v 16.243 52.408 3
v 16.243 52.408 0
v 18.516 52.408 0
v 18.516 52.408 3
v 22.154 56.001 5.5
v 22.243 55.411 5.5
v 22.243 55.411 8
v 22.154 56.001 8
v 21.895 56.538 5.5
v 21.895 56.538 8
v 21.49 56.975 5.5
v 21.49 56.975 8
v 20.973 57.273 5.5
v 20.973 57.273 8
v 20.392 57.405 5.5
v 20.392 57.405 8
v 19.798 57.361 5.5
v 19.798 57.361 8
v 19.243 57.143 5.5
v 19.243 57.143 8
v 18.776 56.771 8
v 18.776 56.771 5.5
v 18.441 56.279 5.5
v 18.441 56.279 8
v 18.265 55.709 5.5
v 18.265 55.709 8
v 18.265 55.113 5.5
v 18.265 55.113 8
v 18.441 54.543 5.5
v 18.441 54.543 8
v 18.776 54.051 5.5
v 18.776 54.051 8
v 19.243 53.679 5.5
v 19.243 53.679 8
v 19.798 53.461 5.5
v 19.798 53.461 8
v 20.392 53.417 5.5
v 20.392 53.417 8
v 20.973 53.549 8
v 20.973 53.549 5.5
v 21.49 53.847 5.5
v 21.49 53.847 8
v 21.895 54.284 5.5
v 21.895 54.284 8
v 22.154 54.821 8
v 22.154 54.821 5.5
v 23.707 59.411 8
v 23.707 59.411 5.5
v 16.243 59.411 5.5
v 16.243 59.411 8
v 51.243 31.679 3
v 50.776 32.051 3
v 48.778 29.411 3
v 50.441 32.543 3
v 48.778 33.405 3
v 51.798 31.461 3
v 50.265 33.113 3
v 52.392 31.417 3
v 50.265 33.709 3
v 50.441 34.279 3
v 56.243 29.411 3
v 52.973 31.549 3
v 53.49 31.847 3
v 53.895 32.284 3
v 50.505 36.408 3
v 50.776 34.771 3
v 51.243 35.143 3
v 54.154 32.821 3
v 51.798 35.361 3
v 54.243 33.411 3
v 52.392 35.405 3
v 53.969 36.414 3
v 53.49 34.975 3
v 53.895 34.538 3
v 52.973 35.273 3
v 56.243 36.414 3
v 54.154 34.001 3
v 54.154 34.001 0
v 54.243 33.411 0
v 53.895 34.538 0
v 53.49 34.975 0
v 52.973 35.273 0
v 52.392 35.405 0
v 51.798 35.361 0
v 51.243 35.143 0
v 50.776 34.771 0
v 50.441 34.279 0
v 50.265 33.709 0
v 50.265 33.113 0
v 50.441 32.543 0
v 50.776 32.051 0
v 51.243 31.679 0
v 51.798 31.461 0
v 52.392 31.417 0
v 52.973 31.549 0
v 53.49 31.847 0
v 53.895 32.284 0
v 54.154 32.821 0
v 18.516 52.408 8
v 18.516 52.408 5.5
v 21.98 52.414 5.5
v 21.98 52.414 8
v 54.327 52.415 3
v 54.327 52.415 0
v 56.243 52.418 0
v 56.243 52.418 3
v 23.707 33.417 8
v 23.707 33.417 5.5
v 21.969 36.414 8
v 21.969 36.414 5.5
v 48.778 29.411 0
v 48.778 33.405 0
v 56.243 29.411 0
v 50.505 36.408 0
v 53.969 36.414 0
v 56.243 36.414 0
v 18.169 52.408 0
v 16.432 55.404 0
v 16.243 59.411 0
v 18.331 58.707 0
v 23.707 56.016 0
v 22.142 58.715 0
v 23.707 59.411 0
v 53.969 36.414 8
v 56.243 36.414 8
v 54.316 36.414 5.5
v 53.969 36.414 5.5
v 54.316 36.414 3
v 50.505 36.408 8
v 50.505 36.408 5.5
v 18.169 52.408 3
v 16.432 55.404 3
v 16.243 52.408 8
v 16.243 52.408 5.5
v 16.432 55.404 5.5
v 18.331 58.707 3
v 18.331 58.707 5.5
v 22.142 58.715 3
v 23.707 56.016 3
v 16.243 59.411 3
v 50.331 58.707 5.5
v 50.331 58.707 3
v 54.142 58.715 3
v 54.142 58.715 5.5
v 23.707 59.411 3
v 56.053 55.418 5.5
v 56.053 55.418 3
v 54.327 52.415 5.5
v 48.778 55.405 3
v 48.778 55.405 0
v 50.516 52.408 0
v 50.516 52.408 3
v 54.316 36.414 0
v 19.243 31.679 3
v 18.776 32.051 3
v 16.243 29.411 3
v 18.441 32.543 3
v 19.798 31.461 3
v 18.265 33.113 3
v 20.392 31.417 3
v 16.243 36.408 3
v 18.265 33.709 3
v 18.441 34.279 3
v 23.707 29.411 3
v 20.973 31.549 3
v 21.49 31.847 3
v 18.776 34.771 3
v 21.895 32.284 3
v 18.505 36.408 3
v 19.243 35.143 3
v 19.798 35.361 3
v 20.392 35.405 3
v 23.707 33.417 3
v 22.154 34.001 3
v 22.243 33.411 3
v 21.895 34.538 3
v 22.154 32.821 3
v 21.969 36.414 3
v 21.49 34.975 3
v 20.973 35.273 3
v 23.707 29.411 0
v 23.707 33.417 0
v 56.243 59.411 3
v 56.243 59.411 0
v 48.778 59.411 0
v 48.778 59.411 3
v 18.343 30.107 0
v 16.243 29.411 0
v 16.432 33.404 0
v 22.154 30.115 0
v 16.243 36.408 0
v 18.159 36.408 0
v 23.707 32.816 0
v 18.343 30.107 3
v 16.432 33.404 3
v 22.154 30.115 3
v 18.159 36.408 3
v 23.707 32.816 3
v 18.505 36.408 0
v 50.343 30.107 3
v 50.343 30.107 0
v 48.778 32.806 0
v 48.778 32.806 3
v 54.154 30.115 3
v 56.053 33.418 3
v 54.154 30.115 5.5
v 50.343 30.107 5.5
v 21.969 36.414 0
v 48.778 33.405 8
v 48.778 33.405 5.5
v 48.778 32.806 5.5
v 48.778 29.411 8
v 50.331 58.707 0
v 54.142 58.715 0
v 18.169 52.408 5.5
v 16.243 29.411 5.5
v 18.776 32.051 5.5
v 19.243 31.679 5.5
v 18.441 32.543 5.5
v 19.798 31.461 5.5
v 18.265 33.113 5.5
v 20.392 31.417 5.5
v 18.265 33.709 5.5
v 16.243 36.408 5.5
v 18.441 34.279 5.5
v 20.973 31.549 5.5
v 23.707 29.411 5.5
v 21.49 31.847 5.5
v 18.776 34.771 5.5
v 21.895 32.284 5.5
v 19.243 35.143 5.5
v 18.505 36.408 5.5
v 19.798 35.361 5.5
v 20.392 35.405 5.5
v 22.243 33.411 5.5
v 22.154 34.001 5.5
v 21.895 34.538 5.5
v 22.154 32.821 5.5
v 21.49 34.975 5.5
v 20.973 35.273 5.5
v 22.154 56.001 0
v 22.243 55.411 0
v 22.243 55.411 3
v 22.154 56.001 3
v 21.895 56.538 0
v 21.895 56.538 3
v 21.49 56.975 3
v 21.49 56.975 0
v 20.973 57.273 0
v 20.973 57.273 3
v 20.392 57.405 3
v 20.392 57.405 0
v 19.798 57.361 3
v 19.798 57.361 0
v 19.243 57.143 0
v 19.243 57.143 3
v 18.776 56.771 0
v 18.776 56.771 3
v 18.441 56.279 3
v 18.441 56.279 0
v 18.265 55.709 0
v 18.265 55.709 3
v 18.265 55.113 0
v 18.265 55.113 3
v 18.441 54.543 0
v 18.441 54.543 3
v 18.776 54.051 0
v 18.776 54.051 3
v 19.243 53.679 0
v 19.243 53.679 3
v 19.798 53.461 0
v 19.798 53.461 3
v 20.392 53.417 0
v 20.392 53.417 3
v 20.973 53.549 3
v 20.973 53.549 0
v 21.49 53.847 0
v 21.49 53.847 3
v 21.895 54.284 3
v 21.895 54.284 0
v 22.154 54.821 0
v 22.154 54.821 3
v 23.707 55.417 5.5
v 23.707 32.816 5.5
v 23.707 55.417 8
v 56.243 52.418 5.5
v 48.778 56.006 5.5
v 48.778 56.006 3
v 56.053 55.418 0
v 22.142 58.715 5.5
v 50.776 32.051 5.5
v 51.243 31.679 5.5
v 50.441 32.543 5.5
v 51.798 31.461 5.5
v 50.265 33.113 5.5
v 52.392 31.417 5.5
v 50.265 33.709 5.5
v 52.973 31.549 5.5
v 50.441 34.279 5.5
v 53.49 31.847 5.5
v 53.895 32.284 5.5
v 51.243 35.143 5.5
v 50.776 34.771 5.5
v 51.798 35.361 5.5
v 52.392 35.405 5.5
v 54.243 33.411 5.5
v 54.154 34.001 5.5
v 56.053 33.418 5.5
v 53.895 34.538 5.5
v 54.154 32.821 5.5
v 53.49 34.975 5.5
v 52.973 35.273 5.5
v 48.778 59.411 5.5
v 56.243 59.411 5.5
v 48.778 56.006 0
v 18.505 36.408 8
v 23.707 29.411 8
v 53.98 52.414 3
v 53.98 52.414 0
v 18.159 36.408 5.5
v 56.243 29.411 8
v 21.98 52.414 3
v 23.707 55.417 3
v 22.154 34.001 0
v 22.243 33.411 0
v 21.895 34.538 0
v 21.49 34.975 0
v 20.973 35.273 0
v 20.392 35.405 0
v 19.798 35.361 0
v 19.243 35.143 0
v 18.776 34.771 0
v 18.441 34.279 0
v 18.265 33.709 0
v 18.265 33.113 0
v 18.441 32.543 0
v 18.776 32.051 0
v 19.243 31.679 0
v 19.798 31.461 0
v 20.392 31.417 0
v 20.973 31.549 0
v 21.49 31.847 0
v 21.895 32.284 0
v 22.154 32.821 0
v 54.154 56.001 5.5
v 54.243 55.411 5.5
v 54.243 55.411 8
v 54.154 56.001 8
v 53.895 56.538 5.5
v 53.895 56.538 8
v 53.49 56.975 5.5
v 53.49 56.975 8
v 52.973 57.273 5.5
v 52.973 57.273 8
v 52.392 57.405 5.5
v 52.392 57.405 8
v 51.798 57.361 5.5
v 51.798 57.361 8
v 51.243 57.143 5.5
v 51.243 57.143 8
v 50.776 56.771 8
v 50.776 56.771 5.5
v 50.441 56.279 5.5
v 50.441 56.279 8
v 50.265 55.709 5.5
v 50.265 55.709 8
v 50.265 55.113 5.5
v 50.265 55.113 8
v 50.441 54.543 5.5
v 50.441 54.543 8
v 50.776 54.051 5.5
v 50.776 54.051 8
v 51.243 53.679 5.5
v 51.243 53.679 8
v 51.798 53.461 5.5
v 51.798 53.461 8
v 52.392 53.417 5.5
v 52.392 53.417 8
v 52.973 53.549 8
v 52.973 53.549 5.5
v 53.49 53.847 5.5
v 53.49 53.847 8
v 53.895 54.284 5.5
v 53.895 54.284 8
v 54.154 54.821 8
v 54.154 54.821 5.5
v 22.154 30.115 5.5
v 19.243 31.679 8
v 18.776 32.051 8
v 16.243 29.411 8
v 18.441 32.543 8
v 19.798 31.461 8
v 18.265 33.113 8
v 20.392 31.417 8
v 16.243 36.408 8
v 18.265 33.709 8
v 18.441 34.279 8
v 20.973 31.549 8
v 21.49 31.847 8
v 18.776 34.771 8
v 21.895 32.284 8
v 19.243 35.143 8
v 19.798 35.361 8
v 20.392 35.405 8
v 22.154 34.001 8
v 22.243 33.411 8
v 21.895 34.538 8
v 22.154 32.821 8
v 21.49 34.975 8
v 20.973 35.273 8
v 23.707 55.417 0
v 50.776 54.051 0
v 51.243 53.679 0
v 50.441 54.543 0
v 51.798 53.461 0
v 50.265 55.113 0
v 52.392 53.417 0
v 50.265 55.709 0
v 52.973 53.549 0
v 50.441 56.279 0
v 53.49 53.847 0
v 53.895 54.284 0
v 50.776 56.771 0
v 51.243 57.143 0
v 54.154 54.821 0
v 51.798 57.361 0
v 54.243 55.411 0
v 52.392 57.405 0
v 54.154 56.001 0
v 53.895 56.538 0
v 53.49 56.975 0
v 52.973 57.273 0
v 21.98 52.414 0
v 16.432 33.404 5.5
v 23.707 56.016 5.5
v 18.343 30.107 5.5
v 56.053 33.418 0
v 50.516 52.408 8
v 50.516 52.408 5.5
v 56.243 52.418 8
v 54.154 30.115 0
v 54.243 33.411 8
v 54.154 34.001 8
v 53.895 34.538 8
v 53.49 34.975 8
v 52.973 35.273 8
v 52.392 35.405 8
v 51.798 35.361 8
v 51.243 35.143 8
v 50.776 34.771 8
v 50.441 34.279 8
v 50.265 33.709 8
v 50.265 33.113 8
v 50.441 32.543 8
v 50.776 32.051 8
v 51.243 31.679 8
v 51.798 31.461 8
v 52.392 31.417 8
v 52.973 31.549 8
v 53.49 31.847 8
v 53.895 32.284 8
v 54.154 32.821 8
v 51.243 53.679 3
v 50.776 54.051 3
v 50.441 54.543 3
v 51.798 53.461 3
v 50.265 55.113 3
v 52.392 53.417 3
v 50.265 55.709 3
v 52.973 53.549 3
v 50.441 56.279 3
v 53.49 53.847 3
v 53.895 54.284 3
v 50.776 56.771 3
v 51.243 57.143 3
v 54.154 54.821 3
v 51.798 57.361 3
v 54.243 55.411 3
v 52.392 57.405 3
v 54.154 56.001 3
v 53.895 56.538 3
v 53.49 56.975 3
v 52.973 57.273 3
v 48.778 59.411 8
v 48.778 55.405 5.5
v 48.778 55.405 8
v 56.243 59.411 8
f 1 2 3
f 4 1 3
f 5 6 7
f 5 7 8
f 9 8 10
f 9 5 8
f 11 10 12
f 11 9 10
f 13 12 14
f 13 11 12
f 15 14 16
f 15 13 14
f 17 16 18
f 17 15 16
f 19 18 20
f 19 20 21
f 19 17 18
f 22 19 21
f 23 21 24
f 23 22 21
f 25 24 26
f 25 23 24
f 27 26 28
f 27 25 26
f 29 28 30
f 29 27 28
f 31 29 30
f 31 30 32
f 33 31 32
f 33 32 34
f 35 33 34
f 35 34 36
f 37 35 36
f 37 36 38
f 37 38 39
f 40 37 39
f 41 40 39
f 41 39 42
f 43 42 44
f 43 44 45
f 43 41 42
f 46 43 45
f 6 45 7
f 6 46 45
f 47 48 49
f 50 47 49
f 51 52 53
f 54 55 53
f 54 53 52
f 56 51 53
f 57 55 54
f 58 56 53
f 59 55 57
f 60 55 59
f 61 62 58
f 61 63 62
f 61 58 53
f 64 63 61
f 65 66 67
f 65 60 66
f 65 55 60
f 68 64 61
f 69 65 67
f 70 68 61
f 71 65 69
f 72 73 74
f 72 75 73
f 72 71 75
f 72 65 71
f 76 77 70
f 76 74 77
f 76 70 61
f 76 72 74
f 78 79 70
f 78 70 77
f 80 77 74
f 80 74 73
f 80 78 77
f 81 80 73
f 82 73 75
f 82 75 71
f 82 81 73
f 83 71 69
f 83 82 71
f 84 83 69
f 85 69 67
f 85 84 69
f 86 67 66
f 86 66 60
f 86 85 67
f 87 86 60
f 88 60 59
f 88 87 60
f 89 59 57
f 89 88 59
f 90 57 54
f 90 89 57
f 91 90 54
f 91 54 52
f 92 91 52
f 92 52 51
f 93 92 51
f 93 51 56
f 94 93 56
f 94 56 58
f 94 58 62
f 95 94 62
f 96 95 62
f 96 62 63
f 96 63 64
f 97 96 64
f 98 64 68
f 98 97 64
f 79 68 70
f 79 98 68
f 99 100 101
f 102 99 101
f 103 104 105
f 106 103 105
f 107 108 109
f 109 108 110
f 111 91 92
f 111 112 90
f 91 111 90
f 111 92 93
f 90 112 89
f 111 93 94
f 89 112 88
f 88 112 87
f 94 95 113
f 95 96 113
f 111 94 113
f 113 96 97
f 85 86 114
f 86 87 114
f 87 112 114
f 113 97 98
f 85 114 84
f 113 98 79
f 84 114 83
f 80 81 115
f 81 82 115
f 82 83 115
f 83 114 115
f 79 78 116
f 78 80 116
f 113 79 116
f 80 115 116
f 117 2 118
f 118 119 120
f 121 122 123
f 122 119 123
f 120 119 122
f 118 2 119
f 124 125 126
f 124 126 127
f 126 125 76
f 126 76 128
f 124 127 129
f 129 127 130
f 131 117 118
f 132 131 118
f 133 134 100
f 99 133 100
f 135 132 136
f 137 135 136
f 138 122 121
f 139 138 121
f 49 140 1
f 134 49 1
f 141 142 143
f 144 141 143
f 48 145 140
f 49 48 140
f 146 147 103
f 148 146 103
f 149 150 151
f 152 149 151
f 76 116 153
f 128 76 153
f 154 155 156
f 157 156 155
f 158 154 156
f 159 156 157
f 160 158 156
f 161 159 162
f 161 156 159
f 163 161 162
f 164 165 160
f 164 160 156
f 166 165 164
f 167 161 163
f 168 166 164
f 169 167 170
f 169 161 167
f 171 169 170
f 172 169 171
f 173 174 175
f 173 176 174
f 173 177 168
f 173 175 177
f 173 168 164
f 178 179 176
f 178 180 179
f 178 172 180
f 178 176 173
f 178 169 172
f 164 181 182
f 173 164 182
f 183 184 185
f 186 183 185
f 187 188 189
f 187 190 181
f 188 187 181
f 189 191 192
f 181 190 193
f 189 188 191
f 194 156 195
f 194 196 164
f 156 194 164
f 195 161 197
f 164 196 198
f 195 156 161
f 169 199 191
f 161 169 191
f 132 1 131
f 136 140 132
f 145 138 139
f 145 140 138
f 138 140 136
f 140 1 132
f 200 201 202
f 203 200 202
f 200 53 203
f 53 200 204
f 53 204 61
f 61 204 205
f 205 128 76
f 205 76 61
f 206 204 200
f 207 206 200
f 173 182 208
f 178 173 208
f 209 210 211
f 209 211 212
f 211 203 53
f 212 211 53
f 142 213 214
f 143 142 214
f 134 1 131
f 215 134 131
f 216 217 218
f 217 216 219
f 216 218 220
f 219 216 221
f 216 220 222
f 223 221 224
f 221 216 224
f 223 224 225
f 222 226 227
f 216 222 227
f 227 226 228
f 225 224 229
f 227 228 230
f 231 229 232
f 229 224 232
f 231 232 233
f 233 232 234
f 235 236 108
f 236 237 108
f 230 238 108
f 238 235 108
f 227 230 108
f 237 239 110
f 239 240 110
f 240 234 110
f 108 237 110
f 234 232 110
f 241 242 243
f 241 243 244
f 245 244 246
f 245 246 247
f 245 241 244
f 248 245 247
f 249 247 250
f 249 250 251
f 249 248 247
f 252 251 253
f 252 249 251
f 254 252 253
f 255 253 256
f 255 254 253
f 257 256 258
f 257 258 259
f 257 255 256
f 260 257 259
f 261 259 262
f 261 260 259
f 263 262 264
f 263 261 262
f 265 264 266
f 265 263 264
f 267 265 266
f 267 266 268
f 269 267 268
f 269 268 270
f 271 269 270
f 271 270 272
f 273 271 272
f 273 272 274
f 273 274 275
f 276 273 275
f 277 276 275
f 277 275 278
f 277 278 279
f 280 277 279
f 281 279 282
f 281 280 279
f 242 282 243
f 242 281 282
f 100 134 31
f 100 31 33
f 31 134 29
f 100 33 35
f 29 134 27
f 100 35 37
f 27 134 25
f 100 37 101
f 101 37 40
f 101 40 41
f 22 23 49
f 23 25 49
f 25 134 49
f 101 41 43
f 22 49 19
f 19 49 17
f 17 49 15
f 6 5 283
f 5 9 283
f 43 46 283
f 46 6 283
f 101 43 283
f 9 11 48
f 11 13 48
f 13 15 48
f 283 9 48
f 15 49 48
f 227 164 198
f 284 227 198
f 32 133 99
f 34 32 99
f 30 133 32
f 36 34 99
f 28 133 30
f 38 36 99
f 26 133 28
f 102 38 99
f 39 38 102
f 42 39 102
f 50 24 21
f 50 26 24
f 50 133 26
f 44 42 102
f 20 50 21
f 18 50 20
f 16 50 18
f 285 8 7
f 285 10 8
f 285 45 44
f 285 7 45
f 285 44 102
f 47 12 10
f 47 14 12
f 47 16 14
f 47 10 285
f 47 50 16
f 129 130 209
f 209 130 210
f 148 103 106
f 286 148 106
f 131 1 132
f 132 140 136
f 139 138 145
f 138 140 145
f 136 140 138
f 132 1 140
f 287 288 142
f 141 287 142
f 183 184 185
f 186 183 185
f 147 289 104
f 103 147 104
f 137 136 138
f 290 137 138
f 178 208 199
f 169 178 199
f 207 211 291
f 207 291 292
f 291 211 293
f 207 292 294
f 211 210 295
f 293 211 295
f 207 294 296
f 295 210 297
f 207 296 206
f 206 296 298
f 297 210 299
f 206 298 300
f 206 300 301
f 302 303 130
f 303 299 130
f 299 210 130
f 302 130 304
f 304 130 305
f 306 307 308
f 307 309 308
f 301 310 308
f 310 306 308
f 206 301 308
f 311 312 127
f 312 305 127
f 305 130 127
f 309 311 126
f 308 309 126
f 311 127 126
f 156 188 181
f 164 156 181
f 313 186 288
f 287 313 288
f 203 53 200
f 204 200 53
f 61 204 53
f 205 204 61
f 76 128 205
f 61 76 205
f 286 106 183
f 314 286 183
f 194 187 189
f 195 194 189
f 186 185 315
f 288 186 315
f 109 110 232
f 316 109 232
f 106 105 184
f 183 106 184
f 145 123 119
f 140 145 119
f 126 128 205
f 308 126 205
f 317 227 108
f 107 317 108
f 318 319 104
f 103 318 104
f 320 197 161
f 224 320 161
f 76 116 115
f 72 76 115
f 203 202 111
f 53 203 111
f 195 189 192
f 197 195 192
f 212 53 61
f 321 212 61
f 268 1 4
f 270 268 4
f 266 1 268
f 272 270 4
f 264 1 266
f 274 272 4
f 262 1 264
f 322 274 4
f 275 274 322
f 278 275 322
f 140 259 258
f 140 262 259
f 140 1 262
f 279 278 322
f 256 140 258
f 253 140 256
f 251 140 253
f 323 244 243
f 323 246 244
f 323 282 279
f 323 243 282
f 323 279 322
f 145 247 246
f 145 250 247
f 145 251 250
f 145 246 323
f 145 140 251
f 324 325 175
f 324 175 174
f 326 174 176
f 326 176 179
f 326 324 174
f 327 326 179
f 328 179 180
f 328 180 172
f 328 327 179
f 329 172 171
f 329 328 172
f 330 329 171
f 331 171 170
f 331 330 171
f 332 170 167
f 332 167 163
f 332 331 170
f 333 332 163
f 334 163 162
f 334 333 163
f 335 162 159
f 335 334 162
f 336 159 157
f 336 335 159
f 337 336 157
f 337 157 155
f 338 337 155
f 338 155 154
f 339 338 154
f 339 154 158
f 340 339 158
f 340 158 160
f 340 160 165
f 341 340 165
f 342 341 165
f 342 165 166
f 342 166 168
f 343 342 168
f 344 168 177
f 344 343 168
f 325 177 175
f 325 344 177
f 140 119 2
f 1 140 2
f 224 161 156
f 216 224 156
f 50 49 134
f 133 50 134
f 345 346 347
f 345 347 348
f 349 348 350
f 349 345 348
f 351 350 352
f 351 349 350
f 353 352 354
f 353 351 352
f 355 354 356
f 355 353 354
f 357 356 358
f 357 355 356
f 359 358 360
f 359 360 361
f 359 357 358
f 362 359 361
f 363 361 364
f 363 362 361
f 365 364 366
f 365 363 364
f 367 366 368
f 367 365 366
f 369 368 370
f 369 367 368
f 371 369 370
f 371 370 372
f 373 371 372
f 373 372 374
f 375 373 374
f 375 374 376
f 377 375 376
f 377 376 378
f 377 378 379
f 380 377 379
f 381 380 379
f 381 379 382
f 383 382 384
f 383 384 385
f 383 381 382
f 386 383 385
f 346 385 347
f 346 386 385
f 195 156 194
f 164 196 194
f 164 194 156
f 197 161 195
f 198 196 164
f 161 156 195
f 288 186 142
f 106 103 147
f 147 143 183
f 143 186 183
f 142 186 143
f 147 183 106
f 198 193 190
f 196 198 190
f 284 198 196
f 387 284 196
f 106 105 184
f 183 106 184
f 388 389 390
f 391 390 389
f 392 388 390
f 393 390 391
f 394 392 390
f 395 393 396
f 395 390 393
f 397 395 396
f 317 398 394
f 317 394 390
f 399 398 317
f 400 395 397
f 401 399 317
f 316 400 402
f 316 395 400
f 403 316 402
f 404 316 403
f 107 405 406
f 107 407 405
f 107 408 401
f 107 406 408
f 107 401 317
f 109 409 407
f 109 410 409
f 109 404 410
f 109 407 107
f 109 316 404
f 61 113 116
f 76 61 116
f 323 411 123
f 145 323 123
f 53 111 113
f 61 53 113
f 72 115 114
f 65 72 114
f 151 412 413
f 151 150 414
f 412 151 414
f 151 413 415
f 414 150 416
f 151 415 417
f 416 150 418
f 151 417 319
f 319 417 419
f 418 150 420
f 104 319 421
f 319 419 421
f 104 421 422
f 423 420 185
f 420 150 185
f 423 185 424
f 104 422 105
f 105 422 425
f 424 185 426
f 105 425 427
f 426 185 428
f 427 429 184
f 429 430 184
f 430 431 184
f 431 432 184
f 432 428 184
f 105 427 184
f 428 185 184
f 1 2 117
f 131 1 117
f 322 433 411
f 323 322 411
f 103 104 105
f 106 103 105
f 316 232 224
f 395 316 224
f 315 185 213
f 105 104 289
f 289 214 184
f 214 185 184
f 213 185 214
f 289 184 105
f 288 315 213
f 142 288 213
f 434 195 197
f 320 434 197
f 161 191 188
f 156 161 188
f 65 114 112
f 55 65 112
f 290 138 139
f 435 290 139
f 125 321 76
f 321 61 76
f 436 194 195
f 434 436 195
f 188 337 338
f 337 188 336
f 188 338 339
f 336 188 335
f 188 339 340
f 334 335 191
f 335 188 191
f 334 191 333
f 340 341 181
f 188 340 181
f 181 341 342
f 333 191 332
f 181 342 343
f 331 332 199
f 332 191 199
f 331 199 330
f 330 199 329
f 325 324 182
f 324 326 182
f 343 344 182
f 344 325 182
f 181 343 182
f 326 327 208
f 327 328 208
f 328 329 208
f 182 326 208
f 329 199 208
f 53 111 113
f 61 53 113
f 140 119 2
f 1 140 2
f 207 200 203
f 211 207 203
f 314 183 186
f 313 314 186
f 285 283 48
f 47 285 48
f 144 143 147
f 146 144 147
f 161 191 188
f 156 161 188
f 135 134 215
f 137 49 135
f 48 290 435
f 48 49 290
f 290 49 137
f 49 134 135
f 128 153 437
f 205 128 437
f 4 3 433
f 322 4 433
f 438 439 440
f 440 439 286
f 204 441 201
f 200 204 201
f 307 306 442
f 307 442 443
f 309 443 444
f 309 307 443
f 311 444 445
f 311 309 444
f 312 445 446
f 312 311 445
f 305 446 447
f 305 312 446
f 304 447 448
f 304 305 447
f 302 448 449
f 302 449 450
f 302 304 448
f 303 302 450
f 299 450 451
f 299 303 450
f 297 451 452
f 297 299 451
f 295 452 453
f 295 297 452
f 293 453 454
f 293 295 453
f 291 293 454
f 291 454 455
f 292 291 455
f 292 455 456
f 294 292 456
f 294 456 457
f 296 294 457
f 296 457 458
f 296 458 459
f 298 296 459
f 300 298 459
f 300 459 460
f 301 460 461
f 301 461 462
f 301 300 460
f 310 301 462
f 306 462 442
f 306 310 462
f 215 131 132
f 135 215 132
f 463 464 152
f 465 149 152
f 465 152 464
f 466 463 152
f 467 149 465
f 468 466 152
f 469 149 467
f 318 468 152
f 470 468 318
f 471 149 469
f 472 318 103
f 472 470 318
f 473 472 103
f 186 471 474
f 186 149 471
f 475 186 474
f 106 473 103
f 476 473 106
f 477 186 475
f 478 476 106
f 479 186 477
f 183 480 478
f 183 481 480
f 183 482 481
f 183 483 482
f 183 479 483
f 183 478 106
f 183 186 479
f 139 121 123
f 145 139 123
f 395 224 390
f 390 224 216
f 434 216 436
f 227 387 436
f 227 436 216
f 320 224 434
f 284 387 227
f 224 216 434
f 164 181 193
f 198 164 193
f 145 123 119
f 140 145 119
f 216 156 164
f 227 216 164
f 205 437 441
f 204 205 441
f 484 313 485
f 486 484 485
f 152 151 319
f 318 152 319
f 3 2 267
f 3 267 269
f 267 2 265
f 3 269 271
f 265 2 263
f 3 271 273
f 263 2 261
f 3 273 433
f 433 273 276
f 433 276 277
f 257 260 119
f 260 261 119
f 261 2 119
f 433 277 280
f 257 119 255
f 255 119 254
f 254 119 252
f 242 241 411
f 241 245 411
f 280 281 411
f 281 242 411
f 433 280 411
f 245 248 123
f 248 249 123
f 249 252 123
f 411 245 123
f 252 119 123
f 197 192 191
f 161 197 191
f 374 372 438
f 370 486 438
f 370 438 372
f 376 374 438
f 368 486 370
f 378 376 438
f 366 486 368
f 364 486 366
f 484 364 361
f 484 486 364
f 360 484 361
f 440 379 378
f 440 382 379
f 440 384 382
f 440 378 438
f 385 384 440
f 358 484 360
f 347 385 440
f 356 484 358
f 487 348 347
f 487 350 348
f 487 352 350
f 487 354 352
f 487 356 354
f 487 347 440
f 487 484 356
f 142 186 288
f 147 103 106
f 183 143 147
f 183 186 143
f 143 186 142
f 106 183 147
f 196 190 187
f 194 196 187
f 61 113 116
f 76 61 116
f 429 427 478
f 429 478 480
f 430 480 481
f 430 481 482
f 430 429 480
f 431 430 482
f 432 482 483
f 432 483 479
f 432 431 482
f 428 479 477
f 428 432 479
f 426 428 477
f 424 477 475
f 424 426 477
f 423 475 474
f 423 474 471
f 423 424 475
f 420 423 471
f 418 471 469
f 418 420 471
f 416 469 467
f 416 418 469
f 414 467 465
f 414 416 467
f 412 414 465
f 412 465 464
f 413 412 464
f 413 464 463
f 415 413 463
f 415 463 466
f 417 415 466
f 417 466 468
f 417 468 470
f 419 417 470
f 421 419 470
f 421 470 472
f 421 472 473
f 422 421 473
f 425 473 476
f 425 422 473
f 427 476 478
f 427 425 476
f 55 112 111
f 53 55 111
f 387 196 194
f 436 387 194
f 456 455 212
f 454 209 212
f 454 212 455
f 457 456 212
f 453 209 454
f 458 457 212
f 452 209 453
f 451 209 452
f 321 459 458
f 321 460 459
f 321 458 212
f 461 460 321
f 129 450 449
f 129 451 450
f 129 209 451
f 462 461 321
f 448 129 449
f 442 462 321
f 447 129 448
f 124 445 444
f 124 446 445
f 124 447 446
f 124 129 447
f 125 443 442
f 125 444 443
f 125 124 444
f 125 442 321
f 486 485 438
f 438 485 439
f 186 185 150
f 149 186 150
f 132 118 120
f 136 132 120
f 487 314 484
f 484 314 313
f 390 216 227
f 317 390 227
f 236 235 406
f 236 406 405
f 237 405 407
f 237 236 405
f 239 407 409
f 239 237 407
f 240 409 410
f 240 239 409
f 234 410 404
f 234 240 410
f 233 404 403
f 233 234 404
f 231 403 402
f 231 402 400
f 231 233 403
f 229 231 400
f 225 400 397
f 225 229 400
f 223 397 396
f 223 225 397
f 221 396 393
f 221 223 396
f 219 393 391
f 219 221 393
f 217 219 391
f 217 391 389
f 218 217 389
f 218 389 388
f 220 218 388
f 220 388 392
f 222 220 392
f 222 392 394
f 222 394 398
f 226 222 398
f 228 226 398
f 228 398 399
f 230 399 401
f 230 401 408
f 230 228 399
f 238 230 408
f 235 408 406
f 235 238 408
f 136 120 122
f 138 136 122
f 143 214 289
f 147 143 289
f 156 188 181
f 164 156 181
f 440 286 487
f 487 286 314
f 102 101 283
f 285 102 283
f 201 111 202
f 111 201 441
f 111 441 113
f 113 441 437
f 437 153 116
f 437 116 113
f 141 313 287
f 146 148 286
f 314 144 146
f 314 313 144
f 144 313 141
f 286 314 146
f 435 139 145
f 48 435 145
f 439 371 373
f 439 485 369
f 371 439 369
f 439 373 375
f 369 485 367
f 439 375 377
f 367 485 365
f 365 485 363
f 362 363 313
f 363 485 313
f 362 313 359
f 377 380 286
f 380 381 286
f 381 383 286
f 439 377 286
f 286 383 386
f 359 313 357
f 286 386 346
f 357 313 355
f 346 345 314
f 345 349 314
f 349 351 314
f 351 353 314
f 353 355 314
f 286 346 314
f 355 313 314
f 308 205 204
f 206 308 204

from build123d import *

# Parameters (mm, degrees)
F0_R      = 2
F1_DEPTH  = 3
F2_DEPTH  = 3
F3_DEPTH  = 2.5
F4_START  = 2.5
F1_FACE_R = 2
F4_DEPTH  = 2.5


with BuildPart() as f1:
    # F0 (on Top) → F1 (new body)
    with BuildSketch(Plane.XY):
        Polygon((56.2425711751, 29.4110085815), (56.2425711751, 36.414245103), (54.3157895307, 36.414245103), (56.0530762776, 33.4181404888), (54.1540001392, 30.1145803152), (50.3434950368, 30.1074484079), (48.7784756274, 32.8064627658), (48.7784756274, 29.4110085815), align=None)
        Polygon((56.0530762776, 33.4181404888), (54.3157895307, 36.414245103), (53.9690040281, 36.414245103), (50.5049084804, 36.4077615509), (48.7784756274, 33.4045250294), (48.7784756274, 32.8064627658), (50.3434950368, 30.1074484079), (54.1540001392, 30.1145803152), align=None)
        with Locations((52.2425711751, 33.4110085815)):
            Circle(F0_R, mode=Mode.SUBTRACT)
    extrude(amount=F1_DEPTH)


with BuildPart() as f1b:
    # F0 (on Top) → F1, piece 2 (new body)
    with BuildSketch(Plane.XY):
        Polygon((18.1588716375, 36.4077615509), (16.2425711751, 36.4077615509), (16.2425711751, 29.4110085815), (23.7066667228, 29.4110085815), (23.7066667228, 32.8155396842), (22.1540001392, 30.1145803152), (18.3434950368, 30.1074484079), (16.4320660726, 33.4038766742), align=None)
        Polygon((18.5049084804, 36.4077615509), (18.1588716375, 36.4077615509), (16.4320660726, 33.4038766742), (18.3434950368, 30.1074484079), (22.1540001392, 30.1145803152), (23.7066667228, 32.8155396842), (23.7066667228, 33.4174921336), (21.9690040281, 36.414245103), align=None)
        with Locations((20.2425711751, 33.4110085815)):
            Circle(F0_R, mode=Mode.SUBTRACT)
    extrude(amount=F1_DEPTH)


with BuildPart() as f1c:
    # F0 (on Top) → F1, piece 3 (new body)
    with BuildSketch(Plane.XY):
        Polygon((23.7066667228, 59.4110085815), (16.2425711751, 59.4110085815), (16.2425711751, 52.40777206), (18.1693528195, 52.40777206), (16.4320660726, 55.4038766742), (18.331142211, 58.7074368479), (22.1416473134, 58.7145687551), (23.7066667228, 56.0155543972), align=None)
        Polygon((23.7066667228, 55.4174921336), (23.7066667228, 56.0155543972), (22.1416473134, 58.7145687551), (18.331142211, 58.7074368479), (16.4320660726, 55.4038766742), (18.1693528195, 52.40777206), (18.5161383221, 52.40777206), (21.9802338698, 52.4142556121), align=None)
        with Locations((20.2425711751, 55.4110085815)):
            Circle(F0_R, mode=Mode.SUBTRACT)
    extrude(amount=F1_DEPTH)


with BuildPart() as f1d:
    # F0 (on Top) → F1, piece 4 (new body)
    with BuildSketch(Plane.XY):
        Polygon((56.2425711751, 59.4110085815), (48.7784756274, 59.4110085815), (48.7784756274, 56.0064774788), (50.331142211, 58.7074368479), (54.1416473134, 58.7145687551), (56.0530762776, 55.4181404888), (54.3266434245, 52.4149039673), (56.2425711751, 52.4184899011), align=None)
        Polygon((50.331142211, 58.7074368479), (48.7784756274, 56.0064774788), (48.7784756274, 55.4045250294), (50.5161383221, 52.40777206), (53.9802338698, 52.4142556121), (54.3266434245, 52.4149039673), (56.0530762776, 55.4181404888), (54.1416473134, 58.7145687551), align=None)
        with Locations((52.2425711751, 55.4110085815)):
            Circle(F0_R, mode=Mode.SUBTRACT)
    extrude(amount=F1_DEPTH)


with BuildPart() as f2:
    # F0 (on Top) → F2 (new body, through all)
    with BuildSketch(Plane.XY):
        Polygon((56.2425711751, 29.4110085815), (56.2425711751, 36.414245103), (54.3157895307, 36.414245103), (56.0530762776, 33.4181404888), (54.1540001392, 30.1145803152), (50.3434950368, 30.1074484079), (48.7784756274, 32.8064627658), (48.7784756274, 29.4110085815), align=None)
    extrude(amount=F2_DEPTH)


with BuildPart() as f2b:
    # F0 (on Top) → F2, piece 2 (new body, through all)
    with BuildSketch(Plane.XY):
        Polygon((56.2425711751, 59.4110085815), (48.7784756274, 59.4110085815), (48.7784756274, 56.0064774788), (50.331142211, 58.7074368479), (54.1416473134, 58.7145687551), (56.0530762776, 55.4181404888), (54.3266434245, 52.4149039673), (56.2425711751, 52.4184899011), align=None)
    extrude(amount=F2_DEPTH)


with BuildPart() as f2c:
    # F0 (on Top) → F2, piece 3 (new body, through all)
    with BuildSketch(Plane.XY):
        Polygon((23.7066667228, 59.4110085815), (16.2425711751, 59.4110085815), (16.2425711751, 52.40777206), (18.1693528195, 52.40777206), (16.4320660726, 55.4038766742), (18.331142211, 58.7074368479), (22.1416473134, 58.7145687551), (23.7066667228, 56.0155543972), align=None)
    extrude(amount=F2_DEPTH)


with BuildPart() as f2d:
    # F0 (on Top) → F2, piece 4 (new body, through all)
    with BuildSketch(Plane.XY):
        Polygon((18.1588716375, 36.4077615509), (16.2425711751, 36.4077615509), (16.2425711751, 29.4110085815), (23.7066667228, 29.4110085815), (23.7066667228, 32.8155396842), (22.1540001392, 30.1145803152), (18.3434950368, 30.1074484079), (16.4320660726, 33.4038766742), align=None)
    extrude(amount=F2_DEPTH)


with BuildPart() as f3:
    # F3 (new): a face of the model
    f3_faces = [f2.part.faces().sort_by_distance(p)[0] for p in [
        (52.5105234013, 29.5133599587, 3),
    ]]
    extrude(f3_faces, amount=F3_DEPTH)

    # F1_face (on face) → F4 (join)
    with BuildSketch(Plane(origin=(52.8230493213, 32.5673462874, 3), x_dir=(1, 0, 0), z_dir=(0, 0, 1)).offset(F4_START)):
        Polygon((-4.0445736939, -3.1563377059), (3.4195218538, -3.1563377059), (3.4195218538, 3.8468988156), (1.1459547068, 3.8468988156), (-2.3181408409, 3.8404152635), (-4.0445736939, 0.837178742), align=None)
        with Locations((-0.5804781462, 0.8436622941)):
            Circle(F1_FACE_R, mode=Mode.SUBTRACT)
    extrude(amount=F4_DEPTH)


with BuildPart() as f3b:
    # F3#2 (new): a face of the model
    f3_2_faces = [f2d.part.faces().sort_by_distance(p)[0] for p in [
        (17.2067727863, 34.9568067074, 3),
    ]]
    extrude(f3_2_faces, amount=F3_DEPTH)


with BuildPart() as f3c:
    # F3#3 (new): a face of the model
    f3_3_faces = [f2c.part.faces().sort_by_distance(p)[0] for p in [
        (19.9746189489, 59.3086572043, 3),
    ]]
    extrude(f3_3_faces, amount=F3_DEPTH)


with BuildPart() as f3d:
    # F3#4 (new): a face of the model
    f3_4_faces = [f2b.part.faces().sort_by_distance(p)[0] for p in [
        (52.5105234013, 59.3087059901, 3),
    ]]
    extrude(f3_4_faces, amount=F3_DEPTH)


with BuildPart() as f4:
    # F1_face (on face) → F4, piece 2 (new body)
    with BuildSketch(Plane(origin=(52.8230493213, 32.5673462874, 3), x_dir=(1, 0, 0), z_dir=(0, 0, 1)).offset(F4_START)):
        Polygon((-36.5804781462, 3.8404152635), (-36.5804781462, -3.1563377059), (-29.1163825985, -3.1563377059), (-29.1163825985, 0.8501458462), (-30.8540452932, 3.8468988156), (-34.3181408409, 3.8404152635), align=None)
        with Locations((-32.5804781462, 0.8436622941)):
            Circle(F1_FACE_R, mode=Mode.SUBTRACT)
    extrude(amount=F4_DEPTH)


with BuildPart() as f4b:
    # F1_face (on face) → F4, piece 3 (new body)
    with BuildSketch(Plane(origin=(52.8230493213, 32.5673462874, 3), x_dir=(1, 0, 0), z_dir=(0, 0, 1)).offset(F4_START)):
        Polygon((-29.1163825985, 26.8436622941), (-36.5804781462, 26.8436622941), (-36.5804781462, 19.8404257726), (-34.3069109992, 19.8404257726), (-30.8428154515, 19.8469093247), (-29.1163825985, 22.8501458462), align=None)
        with Locations((-32.5804781462, 22.8436622941)):
            Circle(F1_FACE_R, mode=Mode.SUBTRACT)
    extrude(amount=F4_DEPTH)


with BuildPart() as f4c:
    # F1_face (on face) → F4, piece 4 (new body)
    with BuildSketch(Plane(origin=(52.8230493213, 32.5673462874, 3), x_dir=(1, 0, 0), z_dir=(0, 0, 1)).offset(F4_START)):
        Polygon((3.4195218538, 26.8436622941), (-4.0445736939, 26.8436622941), (-4.0445736939, 22.837178742), (-2.3069109992, 19.8404257726), (3.4195218538, 19.8511436137), align=None)
        with Locations((-0.5804781462, 22.8436622941)):
            Circle(F1_FACE_R, mode=Mode.SUBTRACT)
    extrude(amount=F4_DEPTH)


solid = Compound([f1.part, f1b.part, f1c.part, f1d.part, f2.part, f2b.part, f2c.part, f2d.part, f3.part, f3b.part, f3c.part, f3d.part, f4.part, f4b.part, f4c.part])
